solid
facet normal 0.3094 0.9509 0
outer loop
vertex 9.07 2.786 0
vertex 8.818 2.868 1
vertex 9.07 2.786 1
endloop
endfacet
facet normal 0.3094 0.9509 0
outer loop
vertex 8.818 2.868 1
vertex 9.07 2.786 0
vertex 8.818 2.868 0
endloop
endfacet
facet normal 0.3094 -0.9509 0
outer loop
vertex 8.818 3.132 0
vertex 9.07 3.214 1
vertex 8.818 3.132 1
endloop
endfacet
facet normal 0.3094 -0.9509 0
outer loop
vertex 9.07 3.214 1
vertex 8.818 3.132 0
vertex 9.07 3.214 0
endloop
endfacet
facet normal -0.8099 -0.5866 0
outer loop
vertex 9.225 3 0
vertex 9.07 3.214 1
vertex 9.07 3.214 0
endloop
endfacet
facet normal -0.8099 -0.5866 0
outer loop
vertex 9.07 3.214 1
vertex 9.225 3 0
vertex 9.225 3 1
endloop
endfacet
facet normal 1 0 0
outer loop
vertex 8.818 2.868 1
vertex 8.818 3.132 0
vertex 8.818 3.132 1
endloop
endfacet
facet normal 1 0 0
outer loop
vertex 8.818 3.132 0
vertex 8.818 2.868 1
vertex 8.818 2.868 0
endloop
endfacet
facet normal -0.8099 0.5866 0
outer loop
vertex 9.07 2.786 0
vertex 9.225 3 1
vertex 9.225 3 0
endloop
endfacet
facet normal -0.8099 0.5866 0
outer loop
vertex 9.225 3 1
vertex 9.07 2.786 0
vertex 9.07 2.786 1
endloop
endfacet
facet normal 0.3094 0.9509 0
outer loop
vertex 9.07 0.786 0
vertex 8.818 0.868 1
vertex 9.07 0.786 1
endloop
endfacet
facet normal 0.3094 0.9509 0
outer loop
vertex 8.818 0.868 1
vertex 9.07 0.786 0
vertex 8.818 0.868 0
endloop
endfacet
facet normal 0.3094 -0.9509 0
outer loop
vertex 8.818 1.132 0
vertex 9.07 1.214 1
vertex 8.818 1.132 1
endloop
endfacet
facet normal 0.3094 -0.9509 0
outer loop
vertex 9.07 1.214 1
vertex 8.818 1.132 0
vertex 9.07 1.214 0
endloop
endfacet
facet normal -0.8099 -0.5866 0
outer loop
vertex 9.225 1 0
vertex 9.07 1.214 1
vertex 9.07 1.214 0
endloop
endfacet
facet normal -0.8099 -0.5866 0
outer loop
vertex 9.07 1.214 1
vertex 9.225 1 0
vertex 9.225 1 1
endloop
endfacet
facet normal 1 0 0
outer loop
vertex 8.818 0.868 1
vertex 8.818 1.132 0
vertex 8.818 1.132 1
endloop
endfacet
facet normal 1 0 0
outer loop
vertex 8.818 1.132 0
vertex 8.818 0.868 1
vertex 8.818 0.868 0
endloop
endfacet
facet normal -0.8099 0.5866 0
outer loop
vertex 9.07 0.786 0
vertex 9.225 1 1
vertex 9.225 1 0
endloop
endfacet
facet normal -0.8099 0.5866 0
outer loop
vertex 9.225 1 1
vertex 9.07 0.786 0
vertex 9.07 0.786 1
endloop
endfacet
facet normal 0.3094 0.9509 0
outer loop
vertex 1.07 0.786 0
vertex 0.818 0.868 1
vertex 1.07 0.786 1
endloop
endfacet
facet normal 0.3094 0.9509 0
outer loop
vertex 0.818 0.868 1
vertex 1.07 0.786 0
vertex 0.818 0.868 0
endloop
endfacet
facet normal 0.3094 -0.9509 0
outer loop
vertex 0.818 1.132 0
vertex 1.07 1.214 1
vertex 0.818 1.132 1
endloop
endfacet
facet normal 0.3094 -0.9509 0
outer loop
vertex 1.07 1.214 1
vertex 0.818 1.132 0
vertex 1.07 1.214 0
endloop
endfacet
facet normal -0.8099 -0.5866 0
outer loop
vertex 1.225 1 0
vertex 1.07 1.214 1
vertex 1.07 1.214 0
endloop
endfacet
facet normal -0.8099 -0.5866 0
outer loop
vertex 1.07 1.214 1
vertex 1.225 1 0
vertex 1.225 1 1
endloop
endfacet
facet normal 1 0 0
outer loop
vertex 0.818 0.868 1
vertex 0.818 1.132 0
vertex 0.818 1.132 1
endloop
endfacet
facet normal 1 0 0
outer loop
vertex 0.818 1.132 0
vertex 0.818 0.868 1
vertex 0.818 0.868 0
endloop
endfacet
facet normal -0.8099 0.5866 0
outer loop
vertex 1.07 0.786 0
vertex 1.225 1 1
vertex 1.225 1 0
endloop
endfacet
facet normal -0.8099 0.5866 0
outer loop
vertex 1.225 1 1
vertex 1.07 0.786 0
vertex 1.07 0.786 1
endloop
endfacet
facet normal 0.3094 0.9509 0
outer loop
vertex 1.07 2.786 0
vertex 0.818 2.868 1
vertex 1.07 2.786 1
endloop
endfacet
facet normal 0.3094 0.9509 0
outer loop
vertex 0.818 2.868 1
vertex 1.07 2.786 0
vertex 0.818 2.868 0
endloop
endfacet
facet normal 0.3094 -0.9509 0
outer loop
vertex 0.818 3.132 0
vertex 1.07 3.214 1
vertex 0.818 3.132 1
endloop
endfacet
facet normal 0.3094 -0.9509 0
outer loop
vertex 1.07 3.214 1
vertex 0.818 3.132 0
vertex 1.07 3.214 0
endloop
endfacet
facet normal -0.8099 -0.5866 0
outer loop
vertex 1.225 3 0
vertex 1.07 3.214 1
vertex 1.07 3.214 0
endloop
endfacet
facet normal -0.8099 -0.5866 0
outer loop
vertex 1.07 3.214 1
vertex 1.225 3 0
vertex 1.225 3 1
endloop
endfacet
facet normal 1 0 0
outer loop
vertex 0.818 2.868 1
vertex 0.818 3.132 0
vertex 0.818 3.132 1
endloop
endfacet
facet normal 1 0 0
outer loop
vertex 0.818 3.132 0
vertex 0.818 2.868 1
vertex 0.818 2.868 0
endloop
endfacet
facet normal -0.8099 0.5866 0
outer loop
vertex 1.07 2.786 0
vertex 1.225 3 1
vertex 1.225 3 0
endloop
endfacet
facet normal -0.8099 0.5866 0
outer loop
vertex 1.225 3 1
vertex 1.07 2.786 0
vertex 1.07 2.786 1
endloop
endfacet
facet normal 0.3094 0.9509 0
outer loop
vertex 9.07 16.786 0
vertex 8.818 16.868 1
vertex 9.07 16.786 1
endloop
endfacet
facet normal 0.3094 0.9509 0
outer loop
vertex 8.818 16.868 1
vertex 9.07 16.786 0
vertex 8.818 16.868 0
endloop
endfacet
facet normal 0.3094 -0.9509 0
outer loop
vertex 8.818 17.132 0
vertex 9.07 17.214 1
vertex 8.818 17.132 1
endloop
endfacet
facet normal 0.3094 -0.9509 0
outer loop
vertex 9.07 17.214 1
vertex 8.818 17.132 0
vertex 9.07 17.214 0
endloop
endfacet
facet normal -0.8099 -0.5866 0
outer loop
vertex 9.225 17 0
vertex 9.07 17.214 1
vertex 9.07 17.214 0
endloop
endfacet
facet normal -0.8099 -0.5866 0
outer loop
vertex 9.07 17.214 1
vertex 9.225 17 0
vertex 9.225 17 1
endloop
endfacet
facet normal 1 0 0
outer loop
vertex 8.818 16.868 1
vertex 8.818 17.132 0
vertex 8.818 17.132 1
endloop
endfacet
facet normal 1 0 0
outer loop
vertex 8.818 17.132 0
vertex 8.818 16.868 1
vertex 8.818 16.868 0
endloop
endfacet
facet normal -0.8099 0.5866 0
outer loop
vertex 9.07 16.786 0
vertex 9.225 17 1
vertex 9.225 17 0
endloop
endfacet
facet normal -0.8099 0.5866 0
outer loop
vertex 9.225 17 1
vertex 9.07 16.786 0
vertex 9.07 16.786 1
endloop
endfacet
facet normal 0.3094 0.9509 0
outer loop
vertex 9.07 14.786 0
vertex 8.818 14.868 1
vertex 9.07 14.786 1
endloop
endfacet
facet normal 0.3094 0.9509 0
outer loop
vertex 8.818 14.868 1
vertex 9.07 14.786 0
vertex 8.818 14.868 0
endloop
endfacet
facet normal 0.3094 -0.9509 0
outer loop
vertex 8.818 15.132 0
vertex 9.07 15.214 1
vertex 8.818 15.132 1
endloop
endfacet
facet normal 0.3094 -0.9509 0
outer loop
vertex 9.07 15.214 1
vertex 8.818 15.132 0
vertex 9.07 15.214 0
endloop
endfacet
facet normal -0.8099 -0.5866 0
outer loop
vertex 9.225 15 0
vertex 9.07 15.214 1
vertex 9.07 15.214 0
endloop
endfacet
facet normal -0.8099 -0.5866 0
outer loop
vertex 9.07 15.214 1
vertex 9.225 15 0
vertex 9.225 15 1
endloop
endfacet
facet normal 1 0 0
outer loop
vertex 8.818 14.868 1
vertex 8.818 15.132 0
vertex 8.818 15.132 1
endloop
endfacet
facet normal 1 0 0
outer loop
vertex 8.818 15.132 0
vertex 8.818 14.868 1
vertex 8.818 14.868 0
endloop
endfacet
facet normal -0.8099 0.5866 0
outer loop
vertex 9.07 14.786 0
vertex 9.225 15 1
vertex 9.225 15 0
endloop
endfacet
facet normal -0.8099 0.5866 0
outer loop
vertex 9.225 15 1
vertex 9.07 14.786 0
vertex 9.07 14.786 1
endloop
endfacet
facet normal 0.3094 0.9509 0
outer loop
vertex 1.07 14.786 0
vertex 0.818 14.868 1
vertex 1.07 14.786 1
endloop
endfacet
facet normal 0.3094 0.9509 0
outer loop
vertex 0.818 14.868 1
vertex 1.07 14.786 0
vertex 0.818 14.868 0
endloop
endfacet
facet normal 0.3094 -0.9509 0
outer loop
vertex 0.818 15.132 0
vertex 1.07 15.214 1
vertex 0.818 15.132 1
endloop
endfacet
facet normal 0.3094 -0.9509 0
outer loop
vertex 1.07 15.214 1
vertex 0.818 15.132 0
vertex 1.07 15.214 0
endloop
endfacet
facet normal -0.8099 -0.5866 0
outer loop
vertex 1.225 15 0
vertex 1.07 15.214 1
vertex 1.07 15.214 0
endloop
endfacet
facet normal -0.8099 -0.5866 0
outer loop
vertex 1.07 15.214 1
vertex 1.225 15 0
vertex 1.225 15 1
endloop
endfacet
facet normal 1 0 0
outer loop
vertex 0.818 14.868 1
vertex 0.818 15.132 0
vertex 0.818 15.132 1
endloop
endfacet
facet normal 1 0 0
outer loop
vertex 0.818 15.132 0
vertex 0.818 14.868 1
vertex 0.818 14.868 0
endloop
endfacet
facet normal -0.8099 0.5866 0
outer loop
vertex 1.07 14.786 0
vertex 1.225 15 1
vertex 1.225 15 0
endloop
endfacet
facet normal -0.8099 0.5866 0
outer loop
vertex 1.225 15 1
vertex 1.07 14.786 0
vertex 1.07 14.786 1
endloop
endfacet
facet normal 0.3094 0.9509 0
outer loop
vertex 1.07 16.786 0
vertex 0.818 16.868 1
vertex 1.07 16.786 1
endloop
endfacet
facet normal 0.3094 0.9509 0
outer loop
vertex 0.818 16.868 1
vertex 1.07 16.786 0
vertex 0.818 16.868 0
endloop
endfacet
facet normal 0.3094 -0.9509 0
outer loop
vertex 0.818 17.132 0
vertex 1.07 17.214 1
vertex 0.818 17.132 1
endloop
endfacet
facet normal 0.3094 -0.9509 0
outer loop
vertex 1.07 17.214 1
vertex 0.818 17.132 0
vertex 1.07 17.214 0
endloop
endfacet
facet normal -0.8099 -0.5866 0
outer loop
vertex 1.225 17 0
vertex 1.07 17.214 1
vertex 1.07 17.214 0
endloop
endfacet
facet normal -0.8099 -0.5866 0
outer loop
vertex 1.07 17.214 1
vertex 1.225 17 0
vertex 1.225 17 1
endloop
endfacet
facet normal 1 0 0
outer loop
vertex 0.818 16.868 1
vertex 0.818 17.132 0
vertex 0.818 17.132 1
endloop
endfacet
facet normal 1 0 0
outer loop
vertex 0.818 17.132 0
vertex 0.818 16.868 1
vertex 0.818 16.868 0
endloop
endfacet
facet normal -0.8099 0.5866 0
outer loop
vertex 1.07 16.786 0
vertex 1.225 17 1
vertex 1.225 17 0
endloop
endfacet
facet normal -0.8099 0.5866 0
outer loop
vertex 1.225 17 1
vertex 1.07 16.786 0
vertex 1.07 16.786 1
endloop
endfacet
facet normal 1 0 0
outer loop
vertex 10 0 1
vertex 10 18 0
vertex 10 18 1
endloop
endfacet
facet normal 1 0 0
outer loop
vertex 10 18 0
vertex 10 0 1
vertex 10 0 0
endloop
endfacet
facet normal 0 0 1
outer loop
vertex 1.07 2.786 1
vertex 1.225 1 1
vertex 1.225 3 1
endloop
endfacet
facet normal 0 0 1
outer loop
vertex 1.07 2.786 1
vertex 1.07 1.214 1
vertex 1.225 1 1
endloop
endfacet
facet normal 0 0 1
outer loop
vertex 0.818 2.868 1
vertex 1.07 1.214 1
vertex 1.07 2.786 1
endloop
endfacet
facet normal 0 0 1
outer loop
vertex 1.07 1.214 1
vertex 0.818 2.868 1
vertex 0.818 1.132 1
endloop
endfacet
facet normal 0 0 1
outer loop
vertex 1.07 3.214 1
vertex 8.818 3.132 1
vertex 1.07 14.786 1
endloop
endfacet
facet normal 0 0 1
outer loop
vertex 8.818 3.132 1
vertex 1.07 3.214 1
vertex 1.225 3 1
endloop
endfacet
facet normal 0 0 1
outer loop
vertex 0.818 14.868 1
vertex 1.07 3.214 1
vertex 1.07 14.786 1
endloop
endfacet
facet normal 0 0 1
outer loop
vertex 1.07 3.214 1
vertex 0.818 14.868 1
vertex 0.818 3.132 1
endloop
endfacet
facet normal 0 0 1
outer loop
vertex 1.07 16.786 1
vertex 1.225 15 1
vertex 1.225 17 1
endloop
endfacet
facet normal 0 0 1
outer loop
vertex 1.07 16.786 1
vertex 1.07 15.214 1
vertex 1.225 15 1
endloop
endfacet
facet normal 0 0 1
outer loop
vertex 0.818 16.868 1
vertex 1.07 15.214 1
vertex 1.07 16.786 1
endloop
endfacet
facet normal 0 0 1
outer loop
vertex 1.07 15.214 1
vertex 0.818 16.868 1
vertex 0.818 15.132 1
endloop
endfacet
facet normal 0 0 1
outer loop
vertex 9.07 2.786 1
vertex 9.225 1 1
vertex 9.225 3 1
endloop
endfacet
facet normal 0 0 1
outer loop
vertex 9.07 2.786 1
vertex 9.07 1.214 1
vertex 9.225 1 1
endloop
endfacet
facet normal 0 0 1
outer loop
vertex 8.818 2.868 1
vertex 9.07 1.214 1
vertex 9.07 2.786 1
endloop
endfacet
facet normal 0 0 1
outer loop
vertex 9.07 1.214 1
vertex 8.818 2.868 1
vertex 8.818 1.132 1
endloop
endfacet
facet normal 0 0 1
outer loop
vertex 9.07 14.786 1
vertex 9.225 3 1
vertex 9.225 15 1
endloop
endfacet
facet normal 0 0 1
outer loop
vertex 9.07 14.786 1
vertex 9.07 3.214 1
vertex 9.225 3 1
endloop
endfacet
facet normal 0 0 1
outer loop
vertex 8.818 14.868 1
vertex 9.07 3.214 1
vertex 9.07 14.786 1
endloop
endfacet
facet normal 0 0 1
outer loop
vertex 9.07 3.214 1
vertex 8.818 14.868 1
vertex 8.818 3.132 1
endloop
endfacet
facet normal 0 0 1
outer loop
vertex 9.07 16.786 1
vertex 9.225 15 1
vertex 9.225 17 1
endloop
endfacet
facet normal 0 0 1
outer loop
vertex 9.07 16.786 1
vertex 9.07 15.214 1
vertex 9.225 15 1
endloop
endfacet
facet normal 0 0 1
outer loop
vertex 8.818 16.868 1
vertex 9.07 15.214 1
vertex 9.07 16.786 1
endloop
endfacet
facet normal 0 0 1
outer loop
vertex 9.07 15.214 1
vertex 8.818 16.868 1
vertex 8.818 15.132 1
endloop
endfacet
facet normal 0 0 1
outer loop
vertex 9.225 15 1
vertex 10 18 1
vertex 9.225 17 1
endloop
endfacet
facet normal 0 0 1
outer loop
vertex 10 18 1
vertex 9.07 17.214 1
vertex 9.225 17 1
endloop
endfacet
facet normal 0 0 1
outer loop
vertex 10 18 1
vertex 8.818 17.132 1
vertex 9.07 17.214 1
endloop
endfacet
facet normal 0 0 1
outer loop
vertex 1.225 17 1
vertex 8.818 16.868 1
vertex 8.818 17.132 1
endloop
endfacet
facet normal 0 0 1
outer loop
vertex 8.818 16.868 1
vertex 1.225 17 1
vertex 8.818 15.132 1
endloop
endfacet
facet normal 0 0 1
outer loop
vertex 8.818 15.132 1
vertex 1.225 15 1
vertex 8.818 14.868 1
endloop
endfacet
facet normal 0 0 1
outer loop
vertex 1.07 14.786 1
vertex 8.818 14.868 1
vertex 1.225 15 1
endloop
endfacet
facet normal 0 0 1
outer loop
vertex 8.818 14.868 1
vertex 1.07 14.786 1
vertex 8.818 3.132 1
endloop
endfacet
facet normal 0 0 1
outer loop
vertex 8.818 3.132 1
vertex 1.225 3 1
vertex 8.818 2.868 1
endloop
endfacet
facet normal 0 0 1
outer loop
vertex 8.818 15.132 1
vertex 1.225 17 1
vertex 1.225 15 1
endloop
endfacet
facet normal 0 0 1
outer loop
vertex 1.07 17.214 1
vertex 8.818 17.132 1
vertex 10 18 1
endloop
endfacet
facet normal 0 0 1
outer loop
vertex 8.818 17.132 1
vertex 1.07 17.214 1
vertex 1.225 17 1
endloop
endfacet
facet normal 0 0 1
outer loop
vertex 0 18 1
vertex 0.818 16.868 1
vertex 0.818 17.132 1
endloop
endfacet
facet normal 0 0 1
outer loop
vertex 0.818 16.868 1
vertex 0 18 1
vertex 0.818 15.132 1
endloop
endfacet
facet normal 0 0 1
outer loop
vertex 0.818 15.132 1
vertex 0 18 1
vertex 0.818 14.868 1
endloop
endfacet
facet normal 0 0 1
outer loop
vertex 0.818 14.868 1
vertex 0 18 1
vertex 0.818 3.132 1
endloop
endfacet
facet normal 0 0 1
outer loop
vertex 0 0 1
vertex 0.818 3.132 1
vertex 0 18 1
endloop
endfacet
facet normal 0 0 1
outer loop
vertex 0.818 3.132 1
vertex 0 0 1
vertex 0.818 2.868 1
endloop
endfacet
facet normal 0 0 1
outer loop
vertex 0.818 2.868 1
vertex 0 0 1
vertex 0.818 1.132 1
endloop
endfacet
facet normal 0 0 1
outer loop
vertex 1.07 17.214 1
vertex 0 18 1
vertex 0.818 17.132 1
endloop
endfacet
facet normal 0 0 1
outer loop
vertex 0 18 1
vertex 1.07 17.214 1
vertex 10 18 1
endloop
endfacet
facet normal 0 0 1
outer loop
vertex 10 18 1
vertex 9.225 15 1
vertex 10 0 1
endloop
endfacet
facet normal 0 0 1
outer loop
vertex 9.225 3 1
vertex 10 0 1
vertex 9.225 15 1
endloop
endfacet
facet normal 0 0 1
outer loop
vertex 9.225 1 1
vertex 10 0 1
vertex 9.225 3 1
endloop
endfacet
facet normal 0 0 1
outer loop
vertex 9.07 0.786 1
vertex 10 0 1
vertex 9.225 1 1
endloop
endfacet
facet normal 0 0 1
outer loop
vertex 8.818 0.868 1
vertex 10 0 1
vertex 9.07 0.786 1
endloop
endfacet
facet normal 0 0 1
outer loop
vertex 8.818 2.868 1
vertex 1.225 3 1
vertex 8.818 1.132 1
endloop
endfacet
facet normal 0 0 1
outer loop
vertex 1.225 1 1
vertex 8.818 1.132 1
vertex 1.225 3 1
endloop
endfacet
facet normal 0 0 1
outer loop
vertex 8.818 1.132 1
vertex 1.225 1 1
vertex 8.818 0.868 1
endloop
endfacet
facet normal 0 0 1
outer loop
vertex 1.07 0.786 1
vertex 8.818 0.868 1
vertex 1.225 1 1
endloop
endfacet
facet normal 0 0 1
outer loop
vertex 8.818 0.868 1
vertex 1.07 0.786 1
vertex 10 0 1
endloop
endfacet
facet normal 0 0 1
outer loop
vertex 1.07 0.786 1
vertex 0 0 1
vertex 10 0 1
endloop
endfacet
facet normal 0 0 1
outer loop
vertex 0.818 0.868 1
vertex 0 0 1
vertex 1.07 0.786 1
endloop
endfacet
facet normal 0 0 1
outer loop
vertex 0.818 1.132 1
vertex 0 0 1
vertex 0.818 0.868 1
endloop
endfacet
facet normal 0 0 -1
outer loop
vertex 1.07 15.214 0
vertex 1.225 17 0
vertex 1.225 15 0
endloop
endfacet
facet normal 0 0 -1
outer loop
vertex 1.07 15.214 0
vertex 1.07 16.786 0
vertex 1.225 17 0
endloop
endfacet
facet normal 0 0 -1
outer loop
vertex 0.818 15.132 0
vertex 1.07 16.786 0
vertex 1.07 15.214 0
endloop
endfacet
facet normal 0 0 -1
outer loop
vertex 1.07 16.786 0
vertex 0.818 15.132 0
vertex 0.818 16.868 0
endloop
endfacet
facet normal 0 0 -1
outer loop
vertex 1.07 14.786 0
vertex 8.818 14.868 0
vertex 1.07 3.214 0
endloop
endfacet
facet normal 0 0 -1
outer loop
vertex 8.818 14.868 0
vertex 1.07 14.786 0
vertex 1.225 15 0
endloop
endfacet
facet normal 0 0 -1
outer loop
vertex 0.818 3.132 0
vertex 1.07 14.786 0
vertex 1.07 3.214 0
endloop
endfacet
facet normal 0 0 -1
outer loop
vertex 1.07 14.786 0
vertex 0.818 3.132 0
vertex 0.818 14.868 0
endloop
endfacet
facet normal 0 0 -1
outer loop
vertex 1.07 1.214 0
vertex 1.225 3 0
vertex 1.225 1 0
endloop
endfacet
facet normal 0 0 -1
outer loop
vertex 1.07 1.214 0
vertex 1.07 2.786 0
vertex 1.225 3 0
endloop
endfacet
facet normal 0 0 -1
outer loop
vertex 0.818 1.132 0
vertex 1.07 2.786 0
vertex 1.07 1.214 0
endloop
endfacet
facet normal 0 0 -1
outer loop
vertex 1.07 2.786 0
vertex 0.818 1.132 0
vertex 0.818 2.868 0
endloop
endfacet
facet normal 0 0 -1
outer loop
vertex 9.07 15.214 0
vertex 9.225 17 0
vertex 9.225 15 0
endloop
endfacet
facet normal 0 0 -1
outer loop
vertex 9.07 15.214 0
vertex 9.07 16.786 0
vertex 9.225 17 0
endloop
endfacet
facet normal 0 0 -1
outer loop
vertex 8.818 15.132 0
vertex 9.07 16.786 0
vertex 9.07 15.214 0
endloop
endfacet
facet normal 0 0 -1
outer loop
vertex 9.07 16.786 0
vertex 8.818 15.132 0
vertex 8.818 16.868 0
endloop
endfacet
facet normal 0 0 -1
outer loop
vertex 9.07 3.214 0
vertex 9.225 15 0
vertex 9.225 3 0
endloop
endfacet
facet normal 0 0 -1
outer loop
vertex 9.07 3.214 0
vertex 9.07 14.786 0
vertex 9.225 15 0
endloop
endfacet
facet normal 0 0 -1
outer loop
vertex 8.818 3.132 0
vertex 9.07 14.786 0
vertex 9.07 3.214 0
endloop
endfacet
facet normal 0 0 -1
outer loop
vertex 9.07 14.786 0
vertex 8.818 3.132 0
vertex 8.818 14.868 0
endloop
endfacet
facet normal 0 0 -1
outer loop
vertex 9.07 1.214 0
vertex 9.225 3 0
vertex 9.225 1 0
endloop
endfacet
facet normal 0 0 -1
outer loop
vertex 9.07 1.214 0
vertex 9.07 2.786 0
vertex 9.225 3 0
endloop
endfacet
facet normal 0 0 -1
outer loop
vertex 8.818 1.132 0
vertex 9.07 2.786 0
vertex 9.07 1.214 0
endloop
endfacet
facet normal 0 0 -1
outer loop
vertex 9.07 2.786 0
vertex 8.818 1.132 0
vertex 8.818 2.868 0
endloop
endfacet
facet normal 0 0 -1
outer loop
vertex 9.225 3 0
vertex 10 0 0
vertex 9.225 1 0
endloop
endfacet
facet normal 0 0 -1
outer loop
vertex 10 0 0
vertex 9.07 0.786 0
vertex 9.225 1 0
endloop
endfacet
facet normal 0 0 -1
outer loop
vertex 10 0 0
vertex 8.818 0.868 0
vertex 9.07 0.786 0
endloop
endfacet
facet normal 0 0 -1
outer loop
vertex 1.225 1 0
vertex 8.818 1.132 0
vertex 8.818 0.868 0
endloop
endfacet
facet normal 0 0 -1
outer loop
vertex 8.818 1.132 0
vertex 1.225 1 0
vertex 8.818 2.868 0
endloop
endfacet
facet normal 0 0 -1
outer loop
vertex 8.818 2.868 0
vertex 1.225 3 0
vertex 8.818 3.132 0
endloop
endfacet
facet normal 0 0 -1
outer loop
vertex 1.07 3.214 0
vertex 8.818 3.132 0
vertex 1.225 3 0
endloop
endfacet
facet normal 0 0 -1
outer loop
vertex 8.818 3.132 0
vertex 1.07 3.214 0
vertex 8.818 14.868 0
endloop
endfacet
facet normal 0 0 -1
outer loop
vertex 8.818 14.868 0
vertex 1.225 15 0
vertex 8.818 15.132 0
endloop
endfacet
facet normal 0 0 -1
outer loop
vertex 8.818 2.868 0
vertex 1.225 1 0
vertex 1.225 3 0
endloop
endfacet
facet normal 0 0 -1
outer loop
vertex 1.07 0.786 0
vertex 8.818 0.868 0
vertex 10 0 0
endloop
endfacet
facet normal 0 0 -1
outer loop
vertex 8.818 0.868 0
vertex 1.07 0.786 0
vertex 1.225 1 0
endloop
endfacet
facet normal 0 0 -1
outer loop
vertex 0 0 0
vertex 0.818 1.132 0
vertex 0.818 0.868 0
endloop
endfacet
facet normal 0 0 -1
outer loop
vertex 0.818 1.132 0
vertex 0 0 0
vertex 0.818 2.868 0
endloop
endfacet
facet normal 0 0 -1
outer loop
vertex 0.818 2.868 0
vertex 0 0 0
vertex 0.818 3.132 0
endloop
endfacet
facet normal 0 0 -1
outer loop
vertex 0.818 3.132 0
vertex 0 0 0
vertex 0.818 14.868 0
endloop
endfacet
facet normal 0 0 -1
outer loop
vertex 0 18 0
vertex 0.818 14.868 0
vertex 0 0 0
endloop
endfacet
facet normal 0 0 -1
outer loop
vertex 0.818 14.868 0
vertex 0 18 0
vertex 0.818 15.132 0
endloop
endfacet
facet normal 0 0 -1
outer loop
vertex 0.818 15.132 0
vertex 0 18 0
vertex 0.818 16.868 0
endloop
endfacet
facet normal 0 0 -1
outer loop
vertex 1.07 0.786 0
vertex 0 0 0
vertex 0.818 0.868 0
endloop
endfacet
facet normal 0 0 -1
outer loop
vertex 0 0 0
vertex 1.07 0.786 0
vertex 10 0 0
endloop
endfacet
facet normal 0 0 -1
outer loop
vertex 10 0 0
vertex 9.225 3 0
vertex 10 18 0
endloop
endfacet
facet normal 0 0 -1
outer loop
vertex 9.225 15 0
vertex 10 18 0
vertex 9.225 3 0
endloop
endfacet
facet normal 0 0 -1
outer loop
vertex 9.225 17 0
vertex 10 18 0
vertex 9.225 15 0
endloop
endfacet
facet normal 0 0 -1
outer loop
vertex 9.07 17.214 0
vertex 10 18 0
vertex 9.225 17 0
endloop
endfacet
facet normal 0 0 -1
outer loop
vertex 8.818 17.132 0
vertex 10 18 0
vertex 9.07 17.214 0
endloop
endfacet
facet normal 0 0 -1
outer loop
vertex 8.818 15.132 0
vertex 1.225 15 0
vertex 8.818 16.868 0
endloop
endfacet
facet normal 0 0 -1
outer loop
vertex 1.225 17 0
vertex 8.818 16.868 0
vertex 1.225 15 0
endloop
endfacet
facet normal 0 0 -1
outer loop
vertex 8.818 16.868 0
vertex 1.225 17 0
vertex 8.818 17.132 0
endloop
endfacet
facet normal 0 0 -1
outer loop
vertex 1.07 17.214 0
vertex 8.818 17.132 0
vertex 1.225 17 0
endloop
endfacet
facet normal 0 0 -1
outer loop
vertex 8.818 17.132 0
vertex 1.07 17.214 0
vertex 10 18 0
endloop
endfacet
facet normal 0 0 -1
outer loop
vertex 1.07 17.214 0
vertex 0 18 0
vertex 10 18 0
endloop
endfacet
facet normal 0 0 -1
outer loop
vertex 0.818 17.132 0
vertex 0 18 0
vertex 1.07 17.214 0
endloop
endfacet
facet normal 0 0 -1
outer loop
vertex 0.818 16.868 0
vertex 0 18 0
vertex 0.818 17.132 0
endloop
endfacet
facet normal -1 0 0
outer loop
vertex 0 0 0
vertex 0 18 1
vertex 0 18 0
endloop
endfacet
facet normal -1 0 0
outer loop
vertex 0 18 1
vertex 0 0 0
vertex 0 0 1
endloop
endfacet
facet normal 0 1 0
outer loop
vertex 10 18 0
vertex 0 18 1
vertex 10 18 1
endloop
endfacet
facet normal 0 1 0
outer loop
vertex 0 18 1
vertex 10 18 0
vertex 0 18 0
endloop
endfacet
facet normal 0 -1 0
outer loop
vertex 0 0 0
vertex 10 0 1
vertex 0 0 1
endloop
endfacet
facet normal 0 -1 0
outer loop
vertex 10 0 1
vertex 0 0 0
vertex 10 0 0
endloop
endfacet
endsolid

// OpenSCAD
wing_width = 10;
wing_depth = 4;
wing_seperation_one_side = 5;
wing_seperation = wing_seperation_one_side * 2;

difference() {
	cube([wing_width , wing_seperation + (wing_depth * 2), 1]);
	translate([wing_width/2, wing_depth/2, 0]) {
		translate([wing_width/2-1, 1, 0]) cylinder(d=0.45, h=3, center=true);
		translate([wing_width/2-1, -1, 0]) cylinder(d=0.45, h=3, center=true)
			;
		translate([-wing_width/2+1, -1, 0]) cylinder(d=0.45, h=3, center=true
				);
		translate([-wing_width/2+1, 1, 0]) cylinder(d=0.45, h=3, center=true)
			;
	}
	translate([wing_width/2, wing_seperation + wing_depth + wing_depth/2, 0]) {
		translate([wing_width/2-1, 1, 0]) cylinder(d=0.45, h=3, center=true);
		translate([wing_width/2-1, -1, 0]) cylinder(d=0.45, h=3, center=true)
			;
		translate([-wing_width/2+1, -1, 0]) cylinder(d=0.45, h=3, center=true
				);
		translate([-wing_width/2+1, 1, 0]) cylinder(d=0.45, h=3, center=true)
			;
	}
}
